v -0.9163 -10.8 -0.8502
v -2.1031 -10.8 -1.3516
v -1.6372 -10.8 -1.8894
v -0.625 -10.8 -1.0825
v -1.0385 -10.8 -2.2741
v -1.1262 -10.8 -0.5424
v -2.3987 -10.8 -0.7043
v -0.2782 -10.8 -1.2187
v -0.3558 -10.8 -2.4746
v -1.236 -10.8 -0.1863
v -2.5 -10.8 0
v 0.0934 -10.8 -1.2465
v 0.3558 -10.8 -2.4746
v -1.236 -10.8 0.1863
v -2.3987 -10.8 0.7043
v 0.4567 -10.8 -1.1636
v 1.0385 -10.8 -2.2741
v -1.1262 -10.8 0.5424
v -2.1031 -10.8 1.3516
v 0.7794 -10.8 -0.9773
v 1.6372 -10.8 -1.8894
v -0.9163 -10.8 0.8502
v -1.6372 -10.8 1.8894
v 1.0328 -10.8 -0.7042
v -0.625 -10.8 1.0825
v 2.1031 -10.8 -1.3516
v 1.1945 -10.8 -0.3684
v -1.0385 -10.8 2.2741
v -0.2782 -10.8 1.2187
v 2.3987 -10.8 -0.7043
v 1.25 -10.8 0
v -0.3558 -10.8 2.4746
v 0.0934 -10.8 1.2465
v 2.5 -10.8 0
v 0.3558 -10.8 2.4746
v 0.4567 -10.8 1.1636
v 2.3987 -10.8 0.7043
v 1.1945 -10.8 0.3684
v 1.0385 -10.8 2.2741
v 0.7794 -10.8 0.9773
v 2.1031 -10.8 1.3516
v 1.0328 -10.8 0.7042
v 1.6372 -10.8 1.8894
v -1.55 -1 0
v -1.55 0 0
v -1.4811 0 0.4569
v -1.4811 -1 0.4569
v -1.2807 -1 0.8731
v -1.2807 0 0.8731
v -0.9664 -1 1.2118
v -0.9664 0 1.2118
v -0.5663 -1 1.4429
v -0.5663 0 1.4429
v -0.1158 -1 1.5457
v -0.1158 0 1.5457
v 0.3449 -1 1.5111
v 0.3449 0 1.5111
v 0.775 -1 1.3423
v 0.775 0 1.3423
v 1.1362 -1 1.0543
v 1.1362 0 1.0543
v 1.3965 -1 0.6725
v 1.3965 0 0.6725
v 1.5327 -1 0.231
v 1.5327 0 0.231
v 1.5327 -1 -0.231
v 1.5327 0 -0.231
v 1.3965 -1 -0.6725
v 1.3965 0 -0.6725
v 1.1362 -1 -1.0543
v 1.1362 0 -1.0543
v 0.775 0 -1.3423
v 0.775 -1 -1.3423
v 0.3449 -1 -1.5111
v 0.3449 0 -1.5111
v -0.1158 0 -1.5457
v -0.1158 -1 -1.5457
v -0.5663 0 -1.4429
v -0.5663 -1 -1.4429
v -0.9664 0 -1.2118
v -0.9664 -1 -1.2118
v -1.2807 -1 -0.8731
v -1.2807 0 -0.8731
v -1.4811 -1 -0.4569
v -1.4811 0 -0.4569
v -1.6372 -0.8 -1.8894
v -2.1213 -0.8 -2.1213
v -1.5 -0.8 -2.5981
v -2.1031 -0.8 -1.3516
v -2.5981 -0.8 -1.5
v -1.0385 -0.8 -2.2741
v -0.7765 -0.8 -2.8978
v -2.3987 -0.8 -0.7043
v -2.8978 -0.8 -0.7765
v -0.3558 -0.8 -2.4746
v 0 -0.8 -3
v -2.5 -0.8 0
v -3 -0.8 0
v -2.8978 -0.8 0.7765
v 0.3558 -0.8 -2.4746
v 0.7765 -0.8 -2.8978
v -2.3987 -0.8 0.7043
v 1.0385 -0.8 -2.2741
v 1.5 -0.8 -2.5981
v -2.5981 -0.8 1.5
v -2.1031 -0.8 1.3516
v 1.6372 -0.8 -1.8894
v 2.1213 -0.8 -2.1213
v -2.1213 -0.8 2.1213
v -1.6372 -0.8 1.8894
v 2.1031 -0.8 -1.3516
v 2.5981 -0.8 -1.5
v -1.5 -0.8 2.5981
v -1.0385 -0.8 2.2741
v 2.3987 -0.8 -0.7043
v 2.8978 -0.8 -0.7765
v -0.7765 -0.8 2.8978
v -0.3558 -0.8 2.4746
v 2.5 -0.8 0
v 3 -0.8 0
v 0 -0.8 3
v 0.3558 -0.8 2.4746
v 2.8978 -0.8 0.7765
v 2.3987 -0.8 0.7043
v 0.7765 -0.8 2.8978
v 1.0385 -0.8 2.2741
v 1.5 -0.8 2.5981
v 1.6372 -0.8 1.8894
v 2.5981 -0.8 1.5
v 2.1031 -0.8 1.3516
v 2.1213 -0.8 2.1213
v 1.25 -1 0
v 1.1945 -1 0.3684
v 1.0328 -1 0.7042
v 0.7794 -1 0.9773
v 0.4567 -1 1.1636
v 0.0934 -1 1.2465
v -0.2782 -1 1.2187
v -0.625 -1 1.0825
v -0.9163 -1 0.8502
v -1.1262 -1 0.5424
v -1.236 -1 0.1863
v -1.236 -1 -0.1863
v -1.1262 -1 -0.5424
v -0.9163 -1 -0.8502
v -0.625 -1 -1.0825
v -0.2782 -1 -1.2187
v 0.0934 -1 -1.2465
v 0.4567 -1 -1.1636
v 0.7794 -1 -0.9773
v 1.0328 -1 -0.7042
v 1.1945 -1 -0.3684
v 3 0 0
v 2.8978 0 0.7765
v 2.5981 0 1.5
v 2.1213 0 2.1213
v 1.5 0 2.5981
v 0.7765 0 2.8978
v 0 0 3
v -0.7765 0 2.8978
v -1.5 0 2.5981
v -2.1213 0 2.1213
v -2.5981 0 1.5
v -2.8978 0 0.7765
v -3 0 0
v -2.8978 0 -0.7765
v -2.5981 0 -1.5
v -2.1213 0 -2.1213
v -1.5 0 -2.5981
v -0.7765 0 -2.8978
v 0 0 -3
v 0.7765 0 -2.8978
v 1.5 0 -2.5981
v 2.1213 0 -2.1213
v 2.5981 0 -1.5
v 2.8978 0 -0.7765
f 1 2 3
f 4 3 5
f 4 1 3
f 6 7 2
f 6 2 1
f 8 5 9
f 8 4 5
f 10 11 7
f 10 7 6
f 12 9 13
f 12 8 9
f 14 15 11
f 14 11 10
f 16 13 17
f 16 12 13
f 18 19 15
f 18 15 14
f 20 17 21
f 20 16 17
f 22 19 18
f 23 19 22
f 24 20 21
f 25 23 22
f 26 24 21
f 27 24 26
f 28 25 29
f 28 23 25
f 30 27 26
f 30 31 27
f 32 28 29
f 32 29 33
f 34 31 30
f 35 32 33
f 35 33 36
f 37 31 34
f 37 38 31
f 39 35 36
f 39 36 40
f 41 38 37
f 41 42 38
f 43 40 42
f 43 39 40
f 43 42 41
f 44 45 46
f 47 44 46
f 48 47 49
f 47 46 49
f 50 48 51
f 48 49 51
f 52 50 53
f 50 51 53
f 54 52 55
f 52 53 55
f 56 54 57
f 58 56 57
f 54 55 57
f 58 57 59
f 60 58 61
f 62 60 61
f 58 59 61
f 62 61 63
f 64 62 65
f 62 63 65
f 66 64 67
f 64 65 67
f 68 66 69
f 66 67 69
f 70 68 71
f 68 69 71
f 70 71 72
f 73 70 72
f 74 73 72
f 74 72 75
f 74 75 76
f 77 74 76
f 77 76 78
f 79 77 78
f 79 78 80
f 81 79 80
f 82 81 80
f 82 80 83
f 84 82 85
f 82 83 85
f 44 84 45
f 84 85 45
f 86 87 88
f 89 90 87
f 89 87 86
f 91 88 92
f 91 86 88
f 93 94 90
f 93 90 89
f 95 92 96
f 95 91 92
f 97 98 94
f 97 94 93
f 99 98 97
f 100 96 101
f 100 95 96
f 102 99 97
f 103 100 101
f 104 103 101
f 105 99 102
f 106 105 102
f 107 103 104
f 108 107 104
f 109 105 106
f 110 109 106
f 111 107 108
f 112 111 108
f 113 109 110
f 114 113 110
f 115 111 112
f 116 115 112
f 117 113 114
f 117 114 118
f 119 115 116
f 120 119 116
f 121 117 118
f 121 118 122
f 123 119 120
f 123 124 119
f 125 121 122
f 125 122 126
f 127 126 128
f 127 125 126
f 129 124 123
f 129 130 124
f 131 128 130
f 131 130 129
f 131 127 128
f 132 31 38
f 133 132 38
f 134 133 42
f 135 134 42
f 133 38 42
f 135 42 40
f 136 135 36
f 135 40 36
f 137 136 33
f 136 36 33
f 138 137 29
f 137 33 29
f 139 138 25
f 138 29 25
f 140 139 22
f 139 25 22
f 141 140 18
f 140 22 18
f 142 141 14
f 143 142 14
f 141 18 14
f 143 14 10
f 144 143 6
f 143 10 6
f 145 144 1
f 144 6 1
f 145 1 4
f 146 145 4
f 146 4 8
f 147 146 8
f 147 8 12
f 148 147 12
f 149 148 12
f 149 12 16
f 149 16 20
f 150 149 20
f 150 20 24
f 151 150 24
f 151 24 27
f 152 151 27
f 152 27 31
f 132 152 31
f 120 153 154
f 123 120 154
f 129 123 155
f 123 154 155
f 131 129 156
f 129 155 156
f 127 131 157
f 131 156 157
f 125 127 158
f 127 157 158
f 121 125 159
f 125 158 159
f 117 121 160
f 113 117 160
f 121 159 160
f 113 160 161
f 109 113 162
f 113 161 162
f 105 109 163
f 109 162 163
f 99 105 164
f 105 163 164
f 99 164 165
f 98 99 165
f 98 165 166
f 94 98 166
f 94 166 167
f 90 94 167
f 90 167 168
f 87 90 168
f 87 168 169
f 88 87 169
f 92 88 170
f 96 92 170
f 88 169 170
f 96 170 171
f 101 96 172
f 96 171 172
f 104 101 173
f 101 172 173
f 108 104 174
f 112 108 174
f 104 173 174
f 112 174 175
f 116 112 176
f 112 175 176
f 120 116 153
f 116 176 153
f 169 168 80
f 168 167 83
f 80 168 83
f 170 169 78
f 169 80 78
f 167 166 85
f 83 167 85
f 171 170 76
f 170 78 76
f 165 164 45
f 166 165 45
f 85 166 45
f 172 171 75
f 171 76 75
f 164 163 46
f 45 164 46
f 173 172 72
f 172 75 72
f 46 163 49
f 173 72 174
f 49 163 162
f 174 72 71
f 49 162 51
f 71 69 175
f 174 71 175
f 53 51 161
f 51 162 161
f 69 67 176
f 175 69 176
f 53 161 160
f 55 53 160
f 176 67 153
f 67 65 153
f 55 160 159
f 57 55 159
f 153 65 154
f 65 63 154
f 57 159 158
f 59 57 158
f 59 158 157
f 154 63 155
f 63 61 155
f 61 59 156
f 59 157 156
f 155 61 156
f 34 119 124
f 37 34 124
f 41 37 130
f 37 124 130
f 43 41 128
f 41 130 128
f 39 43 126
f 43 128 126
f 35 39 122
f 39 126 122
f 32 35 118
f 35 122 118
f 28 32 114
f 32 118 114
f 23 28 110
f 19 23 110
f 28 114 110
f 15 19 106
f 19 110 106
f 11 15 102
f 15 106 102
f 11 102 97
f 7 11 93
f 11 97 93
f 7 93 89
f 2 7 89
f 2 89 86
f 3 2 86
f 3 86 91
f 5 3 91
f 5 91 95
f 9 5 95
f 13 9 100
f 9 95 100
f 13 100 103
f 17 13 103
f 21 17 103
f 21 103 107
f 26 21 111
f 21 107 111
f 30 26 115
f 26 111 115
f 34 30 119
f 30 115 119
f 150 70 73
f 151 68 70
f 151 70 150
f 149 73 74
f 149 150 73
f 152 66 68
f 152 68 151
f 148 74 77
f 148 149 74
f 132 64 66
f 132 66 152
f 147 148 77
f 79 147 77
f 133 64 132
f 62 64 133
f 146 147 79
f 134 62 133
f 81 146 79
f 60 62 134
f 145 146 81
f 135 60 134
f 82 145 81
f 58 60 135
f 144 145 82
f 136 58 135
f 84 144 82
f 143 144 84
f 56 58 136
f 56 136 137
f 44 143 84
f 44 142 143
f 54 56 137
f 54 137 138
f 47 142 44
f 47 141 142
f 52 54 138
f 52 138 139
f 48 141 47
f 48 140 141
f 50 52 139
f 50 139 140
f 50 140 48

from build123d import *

# Parameters (mm, degrees)
F0_R     = 3
F1_DEPTH = 0.8
F2_R     = 2.5
F3_DEPTH = 10
F4_R     = 1.25
F5_DEPTH = 25
F6_R     = 1.55
F6_R_2   = 1.25
F7_DEPTH = 1


with BuildPart() as f1:
    # F0 (on Front) → F1 (new body)
    with BuildSketch(Plane.XZ):
        Circle(F0_R)
    extrude(amount=F1_DEPTH)

    # F2 (on face) → F3 (join)
    with BuildSketch(Plane.XZ.offset(0.8)):
        Circle(F2_R)
    extrude(amount=F3_DEPTH)

    # F4 (on face) → F5 (cut)
    with BuildSketch(Plane.XZ.offset(10.8)):
        Circle(F4_R)
    extrude(amount=-F5_DEPTH, mode=Mode.SUBTRACT)

    # F6 (on face) → F7 (cut)
    with BuildSketch(Plane(origin=(0, 0, 0), x_dir=(-1, 0, 0), z_dir=(0, 1, 0))):
        Circle(F6_R)
        Circle(F6_R_2, mode=Mode.SUBTRACT)
        Circle(F6_R)
    extrude(amount=-F7_DEPTH, mode=Mode.SUBTRACT)


solid = f1.part
